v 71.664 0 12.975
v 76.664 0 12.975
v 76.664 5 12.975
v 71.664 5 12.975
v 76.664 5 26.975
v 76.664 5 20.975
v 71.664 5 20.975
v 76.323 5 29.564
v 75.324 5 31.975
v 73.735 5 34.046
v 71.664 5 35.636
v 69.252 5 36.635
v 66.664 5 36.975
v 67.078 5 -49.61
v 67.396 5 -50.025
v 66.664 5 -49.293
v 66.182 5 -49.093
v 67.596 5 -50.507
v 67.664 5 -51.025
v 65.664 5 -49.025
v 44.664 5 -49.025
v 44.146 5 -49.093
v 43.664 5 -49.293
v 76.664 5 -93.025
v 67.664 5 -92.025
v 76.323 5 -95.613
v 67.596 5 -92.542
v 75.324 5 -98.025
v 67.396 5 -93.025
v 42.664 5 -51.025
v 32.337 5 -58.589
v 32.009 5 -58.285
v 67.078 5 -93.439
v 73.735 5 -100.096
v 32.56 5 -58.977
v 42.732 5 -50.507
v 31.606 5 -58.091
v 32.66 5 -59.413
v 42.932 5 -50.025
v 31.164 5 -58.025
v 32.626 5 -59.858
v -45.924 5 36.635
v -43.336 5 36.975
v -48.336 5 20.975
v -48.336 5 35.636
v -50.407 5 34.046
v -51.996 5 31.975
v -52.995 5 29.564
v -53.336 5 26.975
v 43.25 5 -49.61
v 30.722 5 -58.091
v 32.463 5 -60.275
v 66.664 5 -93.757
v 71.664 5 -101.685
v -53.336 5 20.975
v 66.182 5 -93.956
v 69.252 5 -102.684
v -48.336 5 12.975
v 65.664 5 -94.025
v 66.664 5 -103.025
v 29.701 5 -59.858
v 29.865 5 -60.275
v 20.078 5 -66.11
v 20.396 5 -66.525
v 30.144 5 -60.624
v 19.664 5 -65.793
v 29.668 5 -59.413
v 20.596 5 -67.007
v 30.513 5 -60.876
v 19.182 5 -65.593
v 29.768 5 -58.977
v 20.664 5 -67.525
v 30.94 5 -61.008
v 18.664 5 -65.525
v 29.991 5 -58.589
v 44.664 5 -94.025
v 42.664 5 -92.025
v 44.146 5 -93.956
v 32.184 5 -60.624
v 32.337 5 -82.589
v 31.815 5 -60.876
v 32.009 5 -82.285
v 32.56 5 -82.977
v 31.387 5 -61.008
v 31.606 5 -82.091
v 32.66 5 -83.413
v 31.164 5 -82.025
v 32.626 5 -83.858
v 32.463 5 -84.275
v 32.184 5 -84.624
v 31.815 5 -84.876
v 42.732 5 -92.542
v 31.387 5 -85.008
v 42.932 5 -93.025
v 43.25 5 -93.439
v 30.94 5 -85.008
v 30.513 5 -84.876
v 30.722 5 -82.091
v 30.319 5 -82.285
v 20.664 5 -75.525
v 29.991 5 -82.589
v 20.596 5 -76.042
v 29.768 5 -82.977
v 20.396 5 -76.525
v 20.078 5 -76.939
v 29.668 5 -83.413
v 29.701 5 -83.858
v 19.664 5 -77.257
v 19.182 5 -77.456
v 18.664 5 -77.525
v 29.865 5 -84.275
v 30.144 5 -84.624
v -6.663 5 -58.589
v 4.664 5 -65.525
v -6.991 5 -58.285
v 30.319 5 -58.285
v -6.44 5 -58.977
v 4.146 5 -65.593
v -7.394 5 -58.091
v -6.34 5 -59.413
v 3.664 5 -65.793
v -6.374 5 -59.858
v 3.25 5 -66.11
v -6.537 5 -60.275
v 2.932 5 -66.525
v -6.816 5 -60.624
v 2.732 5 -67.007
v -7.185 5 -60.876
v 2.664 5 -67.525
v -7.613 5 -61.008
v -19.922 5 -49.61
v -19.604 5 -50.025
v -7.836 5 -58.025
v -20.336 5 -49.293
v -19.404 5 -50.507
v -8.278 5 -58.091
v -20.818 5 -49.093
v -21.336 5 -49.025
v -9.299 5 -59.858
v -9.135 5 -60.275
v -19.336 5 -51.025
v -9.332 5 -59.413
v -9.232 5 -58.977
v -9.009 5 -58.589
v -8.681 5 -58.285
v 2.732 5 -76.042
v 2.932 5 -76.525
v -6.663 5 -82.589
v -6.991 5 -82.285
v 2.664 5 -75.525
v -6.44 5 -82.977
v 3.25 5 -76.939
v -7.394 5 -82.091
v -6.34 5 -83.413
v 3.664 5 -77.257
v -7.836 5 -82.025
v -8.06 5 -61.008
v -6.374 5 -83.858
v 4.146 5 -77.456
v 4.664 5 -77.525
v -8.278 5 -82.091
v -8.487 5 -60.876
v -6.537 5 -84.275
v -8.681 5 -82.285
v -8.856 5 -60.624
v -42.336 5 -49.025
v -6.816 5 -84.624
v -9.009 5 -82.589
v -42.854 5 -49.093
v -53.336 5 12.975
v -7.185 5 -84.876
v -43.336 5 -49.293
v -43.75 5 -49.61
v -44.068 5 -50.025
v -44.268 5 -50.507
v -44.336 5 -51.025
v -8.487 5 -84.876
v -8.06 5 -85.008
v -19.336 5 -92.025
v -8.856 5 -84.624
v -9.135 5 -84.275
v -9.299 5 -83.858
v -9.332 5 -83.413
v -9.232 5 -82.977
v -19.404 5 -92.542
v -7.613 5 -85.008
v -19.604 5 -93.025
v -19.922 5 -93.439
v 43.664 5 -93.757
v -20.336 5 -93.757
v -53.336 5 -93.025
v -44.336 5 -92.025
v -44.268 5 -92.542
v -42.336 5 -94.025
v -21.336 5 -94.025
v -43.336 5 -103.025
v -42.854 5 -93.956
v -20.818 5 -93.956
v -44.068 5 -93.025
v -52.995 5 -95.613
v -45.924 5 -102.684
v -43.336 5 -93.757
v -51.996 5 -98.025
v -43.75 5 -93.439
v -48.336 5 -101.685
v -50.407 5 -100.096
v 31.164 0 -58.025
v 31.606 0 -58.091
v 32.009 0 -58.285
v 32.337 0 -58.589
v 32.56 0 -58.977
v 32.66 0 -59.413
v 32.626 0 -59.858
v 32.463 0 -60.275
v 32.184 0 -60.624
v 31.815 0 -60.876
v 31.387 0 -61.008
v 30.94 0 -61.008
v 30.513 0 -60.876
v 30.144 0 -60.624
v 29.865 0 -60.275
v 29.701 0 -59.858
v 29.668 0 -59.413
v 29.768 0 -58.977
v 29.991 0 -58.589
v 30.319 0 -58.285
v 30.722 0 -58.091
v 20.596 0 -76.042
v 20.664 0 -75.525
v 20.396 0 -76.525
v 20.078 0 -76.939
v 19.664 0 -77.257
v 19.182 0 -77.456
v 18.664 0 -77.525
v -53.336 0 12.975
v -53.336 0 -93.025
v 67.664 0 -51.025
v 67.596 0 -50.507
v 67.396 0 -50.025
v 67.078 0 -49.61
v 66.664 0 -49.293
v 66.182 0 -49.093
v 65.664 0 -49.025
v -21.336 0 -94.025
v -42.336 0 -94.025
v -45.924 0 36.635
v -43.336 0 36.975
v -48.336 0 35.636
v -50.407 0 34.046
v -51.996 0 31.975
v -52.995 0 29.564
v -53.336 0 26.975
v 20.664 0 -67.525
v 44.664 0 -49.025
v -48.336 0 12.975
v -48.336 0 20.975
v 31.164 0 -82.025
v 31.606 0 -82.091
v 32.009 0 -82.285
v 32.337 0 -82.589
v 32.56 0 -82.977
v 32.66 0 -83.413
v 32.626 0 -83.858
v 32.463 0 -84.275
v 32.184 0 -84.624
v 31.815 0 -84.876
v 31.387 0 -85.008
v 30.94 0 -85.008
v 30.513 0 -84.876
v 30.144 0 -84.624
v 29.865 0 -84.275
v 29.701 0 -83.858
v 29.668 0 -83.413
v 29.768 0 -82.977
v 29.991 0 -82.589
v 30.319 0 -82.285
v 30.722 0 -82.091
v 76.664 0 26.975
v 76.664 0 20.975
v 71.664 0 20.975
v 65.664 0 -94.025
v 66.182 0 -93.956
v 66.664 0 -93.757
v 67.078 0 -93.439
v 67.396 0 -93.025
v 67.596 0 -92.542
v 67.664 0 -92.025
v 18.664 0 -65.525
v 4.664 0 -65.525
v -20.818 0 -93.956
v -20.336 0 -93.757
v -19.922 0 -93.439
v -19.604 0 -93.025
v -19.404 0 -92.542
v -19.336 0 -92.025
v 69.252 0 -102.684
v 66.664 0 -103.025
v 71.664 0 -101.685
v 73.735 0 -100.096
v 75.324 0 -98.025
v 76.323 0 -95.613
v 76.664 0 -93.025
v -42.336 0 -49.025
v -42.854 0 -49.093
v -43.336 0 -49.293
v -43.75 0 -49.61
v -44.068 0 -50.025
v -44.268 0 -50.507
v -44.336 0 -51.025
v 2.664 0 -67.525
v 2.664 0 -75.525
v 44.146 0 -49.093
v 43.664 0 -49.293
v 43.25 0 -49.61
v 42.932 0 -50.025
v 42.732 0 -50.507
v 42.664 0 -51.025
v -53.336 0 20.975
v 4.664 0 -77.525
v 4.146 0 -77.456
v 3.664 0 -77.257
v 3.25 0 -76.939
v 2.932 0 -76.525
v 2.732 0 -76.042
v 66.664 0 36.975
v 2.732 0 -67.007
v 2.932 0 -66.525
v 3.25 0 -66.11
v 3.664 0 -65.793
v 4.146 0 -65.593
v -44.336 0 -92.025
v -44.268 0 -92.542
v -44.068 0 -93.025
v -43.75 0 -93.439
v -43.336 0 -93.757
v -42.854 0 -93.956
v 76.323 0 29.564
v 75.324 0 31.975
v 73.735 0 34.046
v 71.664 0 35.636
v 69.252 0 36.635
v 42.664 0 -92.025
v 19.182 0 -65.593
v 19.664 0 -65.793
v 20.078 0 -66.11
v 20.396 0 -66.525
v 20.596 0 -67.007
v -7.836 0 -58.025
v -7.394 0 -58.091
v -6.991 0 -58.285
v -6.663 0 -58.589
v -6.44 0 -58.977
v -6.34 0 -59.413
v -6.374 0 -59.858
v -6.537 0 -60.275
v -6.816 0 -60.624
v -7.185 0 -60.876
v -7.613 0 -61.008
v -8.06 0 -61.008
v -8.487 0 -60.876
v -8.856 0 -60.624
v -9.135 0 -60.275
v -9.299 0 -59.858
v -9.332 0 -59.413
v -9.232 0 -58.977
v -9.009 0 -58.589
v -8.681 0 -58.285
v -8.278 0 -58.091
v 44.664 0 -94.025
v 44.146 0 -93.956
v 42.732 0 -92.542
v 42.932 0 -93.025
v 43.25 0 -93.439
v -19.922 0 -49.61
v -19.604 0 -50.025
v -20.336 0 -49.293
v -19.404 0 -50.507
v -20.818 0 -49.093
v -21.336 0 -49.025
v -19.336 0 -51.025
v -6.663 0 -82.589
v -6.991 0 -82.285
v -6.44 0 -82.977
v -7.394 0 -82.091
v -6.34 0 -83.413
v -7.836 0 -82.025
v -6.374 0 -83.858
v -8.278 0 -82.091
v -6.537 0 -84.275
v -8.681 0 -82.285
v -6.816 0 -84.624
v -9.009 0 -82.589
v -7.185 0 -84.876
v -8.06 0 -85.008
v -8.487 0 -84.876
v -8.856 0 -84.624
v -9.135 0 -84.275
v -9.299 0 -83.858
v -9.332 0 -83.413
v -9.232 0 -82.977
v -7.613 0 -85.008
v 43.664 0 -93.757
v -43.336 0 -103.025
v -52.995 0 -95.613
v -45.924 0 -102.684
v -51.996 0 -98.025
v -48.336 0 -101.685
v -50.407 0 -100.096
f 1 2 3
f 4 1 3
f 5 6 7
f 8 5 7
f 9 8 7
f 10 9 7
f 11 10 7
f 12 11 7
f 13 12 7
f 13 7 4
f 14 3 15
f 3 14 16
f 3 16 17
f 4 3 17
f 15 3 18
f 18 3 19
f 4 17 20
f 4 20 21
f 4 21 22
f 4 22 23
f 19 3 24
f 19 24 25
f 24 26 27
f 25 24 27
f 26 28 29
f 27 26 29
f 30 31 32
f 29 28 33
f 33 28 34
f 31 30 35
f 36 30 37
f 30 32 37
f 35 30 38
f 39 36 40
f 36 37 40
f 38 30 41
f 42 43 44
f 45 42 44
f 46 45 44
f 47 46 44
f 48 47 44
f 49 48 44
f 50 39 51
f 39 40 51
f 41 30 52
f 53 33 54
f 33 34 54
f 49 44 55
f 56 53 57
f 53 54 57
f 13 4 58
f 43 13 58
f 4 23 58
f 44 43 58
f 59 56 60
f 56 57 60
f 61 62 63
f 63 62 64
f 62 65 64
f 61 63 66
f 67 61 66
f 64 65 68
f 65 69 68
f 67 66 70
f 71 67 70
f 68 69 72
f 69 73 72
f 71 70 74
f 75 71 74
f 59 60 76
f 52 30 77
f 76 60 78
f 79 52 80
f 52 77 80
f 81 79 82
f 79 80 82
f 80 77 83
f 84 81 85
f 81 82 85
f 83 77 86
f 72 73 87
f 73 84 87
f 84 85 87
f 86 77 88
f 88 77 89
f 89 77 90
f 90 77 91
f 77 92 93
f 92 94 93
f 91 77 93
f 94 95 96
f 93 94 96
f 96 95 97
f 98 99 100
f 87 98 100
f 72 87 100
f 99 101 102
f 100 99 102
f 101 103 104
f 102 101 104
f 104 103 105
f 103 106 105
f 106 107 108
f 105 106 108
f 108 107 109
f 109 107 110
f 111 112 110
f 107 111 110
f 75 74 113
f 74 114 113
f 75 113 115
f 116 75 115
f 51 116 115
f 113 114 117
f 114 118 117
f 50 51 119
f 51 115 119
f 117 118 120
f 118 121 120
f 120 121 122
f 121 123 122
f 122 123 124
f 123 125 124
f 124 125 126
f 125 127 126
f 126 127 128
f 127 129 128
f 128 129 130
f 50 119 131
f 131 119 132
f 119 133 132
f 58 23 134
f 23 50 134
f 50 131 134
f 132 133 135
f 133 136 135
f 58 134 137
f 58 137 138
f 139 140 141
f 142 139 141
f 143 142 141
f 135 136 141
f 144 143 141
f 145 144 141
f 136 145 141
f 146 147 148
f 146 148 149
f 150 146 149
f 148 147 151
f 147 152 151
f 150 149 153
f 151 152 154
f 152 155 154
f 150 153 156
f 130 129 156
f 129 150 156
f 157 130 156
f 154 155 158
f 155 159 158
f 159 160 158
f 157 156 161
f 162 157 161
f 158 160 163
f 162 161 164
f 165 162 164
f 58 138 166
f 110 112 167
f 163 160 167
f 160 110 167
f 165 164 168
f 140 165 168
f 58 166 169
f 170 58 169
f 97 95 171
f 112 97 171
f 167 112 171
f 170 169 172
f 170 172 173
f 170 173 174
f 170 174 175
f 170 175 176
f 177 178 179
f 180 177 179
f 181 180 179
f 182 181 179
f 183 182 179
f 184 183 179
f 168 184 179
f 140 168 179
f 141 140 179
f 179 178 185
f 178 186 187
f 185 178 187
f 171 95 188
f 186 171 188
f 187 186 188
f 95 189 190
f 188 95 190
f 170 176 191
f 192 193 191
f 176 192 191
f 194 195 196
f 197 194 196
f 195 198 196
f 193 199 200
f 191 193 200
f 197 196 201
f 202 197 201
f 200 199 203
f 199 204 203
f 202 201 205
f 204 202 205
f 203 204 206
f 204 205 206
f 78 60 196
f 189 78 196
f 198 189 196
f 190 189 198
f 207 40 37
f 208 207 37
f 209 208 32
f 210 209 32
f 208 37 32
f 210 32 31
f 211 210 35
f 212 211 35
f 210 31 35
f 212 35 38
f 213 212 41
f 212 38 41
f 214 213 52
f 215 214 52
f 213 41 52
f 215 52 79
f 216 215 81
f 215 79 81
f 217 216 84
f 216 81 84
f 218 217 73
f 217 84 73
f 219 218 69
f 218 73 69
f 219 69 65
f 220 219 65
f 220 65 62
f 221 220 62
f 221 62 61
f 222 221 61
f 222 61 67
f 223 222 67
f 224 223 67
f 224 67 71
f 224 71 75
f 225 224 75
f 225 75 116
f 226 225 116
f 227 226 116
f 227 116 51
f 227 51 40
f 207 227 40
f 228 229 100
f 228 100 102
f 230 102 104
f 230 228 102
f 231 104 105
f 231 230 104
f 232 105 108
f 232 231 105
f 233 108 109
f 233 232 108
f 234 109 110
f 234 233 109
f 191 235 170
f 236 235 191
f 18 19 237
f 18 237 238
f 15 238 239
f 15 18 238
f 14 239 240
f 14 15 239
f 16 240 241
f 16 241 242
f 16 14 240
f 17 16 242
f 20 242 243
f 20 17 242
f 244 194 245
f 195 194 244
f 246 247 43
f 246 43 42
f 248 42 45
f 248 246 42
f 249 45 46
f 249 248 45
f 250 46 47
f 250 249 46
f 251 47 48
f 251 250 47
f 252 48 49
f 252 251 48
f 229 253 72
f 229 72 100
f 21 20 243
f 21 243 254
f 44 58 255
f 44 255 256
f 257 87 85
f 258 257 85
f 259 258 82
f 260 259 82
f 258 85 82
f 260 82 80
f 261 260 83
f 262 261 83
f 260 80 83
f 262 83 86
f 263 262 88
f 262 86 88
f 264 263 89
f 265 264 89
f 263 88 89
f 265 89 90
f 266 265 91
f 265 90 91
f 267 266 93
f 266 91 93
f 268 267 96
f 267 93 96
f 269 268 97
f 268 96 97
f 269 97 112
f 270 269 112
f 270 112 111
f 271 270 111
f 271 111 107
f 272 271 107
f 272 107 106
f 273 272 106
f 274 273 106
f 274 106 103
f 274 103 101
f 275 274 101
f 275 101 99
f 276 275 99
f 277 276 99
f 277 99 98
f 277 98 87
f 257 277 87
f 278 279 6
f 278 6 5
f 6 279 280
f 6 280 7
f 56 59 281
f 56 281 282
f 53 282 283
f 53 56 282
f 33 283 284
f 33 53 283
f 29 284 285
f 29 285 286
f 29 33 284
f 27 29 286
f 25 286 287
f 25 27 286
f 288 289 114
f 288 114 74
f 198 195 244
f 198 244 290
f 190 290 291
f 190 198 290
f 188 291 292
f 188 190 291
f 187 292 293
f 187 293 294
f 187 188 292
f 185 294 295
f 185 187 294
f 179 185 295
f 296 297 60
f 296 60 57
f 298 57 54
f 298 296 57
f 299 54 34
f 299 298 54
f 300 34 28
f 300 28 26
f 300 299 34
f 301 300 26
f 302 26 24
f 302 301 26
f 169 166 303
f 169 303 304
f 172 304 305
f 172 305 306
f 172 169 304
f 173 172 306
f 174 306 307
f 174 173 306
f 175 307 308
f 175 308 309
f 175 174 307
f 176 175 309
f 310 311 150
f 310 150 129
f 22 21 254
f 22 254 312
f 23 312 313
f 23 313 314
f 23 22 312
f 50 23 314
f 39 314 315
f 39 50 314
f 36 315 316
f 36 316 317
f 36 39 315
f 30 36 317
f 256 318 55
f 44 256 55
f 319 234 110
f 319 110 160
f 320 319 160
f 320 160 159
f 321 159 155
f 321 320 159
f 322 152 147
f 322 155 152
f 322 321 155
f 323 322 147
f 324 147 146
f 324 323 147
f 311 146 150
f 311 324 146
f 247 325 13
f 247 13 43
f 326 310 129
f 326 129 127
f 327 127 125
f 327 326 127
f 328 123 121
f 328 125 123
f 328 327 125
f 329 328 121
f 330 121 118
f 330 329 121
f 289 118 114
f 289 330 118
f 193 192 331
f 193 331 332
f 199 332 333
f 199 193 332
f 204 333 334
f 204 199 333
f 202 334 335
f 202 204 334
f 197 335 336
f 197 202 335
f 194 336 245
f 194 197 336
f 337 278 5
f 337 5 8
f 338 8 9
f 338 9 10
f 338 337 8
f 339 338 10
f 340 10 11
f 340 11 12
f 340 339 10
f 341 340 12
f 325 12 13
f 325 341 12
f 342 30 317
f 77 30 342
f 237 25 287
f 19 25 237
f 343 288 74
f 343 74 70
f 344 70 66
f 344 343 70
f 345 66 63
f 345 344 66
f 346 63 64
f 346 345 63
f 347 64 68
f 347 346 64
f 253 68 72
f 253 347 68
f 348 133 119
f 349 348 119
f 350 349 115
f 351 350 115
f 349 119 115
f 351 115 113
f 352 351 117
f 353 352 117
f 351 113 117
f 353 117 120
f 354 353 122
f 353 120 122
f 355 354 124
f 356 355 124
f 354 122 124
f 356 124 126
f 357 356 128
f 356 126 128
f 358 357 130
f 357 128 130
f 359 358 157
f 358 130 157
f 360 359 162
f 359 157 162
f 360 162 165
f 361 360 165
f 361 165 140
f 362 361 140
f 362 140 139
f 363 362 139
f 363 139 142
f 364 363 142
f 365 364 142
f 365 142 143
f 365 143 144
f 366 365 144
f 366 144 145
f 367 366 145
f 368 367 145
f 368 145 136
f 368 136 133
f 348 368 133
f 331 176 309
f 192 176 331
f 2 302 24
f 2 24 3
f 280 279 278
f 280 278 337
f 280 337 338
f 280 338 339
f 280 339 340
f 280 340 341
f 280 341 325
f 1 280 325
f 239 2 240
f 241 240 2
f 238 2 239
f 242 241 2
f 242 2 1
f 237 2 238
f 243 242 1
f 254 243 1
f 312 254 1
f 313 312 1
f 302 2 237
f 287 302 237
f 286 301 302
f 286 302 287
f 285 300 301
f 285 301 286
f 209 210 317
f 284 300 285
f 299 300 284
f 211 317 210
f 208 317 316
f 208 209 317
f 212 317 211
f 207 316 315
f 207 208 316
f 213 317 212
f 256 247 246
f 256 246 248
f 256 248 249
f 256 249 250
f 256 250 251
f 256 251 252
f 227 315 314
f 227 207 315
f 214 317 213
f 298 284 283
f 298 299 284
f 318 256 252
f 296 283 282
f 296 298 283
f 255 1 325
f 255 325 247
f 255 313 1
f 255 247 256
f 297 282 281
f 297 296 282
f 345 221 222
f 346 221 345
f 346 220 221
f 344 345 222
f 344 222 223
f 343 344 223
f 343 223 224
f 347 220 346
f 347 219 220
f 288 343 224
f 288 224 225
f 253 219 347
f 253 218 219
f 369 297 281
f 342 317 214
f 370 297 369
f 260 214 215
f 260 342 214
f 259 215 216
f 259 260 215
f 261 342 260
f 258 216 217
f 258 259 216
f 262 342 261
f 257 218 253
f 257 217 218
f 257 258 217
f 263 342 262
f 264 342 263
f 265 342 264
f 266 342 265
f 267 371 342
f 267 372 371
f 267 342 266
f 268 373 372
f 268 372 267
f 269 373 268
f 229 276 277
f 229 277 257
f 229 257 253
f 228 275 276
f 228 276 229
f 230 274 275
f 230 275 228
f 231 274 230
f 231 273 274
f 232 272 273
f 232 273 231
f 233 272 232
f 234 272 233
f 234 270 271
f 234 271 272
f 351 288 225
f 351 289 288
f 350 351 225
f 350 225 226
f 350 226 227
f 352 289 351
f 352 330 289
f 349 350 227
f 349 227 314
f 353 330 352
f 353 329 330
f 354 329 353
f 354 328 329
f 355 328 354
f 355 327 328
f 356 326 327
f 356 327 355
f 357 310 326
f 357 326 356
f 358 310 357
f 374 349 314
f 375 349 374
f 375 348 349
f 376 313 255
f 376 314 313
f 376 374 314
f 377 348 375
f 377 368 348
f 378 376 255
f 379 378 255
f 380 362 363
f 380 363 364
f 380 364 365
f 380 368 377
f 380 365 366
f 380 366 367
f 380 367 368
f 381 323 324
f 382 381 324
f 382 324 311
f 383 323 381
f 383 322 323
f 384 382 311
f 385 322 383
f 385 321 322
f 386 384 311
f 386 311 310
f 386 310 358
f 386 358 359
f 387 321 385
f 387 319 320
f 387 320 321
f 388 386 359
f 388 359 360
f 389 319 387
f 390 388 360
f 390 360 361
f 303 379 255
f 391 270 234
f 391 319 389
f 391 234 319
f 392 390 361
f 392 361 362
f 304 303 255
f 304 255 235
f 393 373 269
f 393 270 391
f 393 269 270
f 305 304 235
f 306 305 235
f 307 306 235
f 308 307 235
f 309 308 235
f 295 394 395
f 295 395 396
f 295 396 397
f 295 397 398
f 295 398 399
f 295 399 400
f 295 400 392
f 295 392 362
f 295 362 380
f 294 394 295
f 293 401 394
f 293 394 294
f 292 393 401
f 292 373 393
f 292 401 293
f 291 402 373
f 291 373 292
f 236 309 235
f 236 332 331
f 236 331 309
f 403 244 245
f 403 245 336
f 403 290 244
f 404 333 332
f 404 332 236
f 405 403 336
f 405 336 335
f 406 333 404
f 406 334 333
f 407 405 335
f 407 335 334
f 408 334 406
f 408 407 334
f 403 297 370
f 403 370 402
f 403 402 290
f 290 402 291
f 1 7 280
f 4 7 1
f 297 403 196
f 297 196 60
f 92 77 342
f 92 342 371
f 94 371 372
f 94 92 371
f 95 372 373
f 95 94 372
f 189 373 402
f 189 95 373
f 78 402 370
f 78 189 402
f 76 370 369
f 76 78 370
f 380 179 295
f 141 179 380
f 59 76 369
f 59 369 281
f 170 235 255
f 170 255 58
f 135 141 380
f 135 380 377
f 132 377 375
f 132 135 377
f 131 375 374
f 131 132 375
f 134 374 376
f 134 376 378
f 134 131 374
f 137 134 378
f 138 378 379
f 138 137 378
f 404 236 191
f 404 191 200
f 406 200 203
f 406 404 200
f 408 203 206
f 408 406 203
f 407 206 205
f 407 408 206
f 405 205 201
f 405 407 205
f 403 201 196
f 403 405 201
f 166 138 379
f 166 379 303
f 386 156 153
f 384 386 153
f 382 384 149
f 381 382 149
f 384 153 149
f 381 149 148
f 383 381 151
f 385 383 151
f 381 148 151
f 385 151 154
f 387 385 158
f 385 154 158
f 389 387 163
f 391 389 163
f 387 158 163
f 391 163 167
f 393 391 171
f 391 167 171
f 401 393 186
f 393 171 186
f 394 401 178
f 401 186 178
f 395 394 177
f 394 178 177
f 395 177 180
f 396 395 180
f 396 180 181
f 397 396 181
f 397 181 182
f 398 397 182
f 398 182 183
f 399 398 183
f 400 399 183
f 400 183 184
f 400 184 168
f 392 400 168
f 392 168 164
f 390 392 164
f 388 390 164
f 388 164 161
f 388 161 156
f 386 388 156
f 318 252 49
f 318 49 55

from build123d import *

# Parameters (mm, degrees)
RESSALTO_EXTRUS_O1_DEPTH = 5
CORTE_EXTRUS_O1_DEPTH    = 5
ESBO_O4_R                = 1.5
CORTE_EXTRUS_O2_DEPTH    = 10
ESBO_O6_W                = 8
ESBO_O6_H                = 5
CORTE_EXTRUS_O3_DEPTH    = 5
CORTE_EXTRUS_O4_DEPTH    = 10
ESBO_O9_W                = 8
ESBO_O9_H                = 5
CORTE_EXTRUS_O5_DEPTH    = 5


with BuildPart() as part:
    # Esboço1 → Ressalto-extrusão1 (new body)
    with BuildSketch(Plane(origin=(0, 0, 0), x_dir=(1, 0, 0), z_dir=(0, 1, 0))):
        with BuildLine():
            Line((-43.336132643, 103.024644241), (66.663867357, 103.024644241))
            ThreePointArc((66.663867357, 103.024644241), (73.734935168, 100.095712053), (76.663867357, 93.024644241))
            Line((76.663867357, 93.024644241), (76.663867357, -26.975355759))
            ThreePointArc((76.663867357, -26.975355759), (73.734935168, -34.046423571), (66.663867357, -36.975355759))
            Line((66.663867357, -36.975355759), (-43.336132643, -36.975355759))
            ThreePointArc((-43.336132643, -36.975355759), (-50.407200455, -34.046423571), (-53.336132643, -26.975355759))
            Line((-53.336132643, -26.975355759), (-53.336132643, 93.024644241))
            ThreePointArc((-53.336132643, 93.024644241), (-50.407200455, 100.095712053), (-43.336132643, 103.024644241))
        make_face()
    extrude(amount=RESSALTO_EXTRUS_O1_DEPTH)

    # Esboço2 → Corte-extrusão1 (cut)
    with BuildSketch(Plane(origin=(0, 5, 0), x_dir=(1, 0, 0), z_dir=(0, 1, 0))):
        with BuildLine():
            Line((-42.336132643, 94.024644241), (-21.336132643, 94.024644241))
            ThreePointArc((-21.336132643, 94.024644241), (-19.921919081, 93.438857803), (-19.336132643, 92.024644241))
            Line((-19.336132643, 92.024644241), (-19.336132643, 51.024644241))
            ThreePointArc((-19.336132643, 51.024644241), (-19.921919081, 49.610430679), (-21.336132643, 49.024644241))
            Line((-21.336132643, 49.024644241), (-42.336132643, 49.024644241))
            ThreePointArc((-42.336132643, 49.024644241), (-43.750346206, 49.610430679), (-44.336132643, 51.024644241))
            Line((-44.336132643, 51.024644241), (-44.336132643, 92.024644241))
            ThreePointArc((-44.336132643, 92.024644241), (-43.750346206, 93.438857803), (-42.336132643, 94.024644241))
        make_face()
        with BuildLine():
            Line((44.663867357, 94.024644241), (65.663867357, 94.024644241))
            ThreePointArc((65.663867357, 94.024644241), (67.078080919, 93.438857803), (67.663867357, 92.024644241))
            Line((67.663867357, 92.024644241), (67.663867357, 51.024644241))
            ThreePointArc((67.663867357, 51.024644241), (67.078080919, 49.610430679), (65.663867357, 49.024644241))
            Line((65.663867357, 49.024644241), (44.663867357, 49.024644241))
            ThreePointArc((44.663867357, 49.024644241), (43.249653794, 49.610430679), (42.663867357, 51.024644241))
            Line((42.663867357, 51.024644241), (42.663867357, 92.024644241))
            ThreePointArc((42.663867357, 92.024644241), (43.249653794, 93.438857803), (44.663867357, 94.024644241))
        make_face()
    extrude(amount=-CORTE_EXTRUS_O1_DEPTH, mode=Mode.SUBTRACT)

    # Esboço4 → Corte-extrusão2 (cut)
    with BuildSketch(Plane(origin=(0, 5, 0), x_dir=(1, 0, 0), z_dir=(0, 1, 0))):
        with Locations(Location((-7.836132643, 59.524644241, 0), (0, 0, 270))):
            Circle(ESBO_O4_R)
        with Locations(Location((31.163867357, 59.524644241, 0), (0, 0, 270))):
            Circle(ESBO_O4_R)
        with Locations(Location((-7.836132643, 83.524644241, 0), (0, 0, 270))):
            Circle(ESBO_O4_R)
        with Locations(Location((31.163867357, 83.524644241, 0), (0, 0, 270))):
            Circle(ESBO_O4_R)
    extrude(amount=-CORTE_EXTRUS_O2_DEPTH, mode=Mode.SUBTRACT)

    # Esboço6 → Corte-extrusão3 (cut)
    with BuildSketch(Plane.ZY.offset(53.336132643)):
        with Locations((16.975355759, 2.5)):
            Rectangle(ESBO_O6_W, ESBO_O6_H)
    extrude(amount=-CORTE_EXTRUS_O3_DEPTH, mode=Mode.SUBTRACT)

    # Esboço7 → Corte-extrusão4 (cut)
    with BuildSketch(Plane.XZ):
        with BuildLine():
            Line((18.663867357, -77.524644241), (4.663867357, -77.524644241))
            ThreePointArc((4.663867357, -77.524644241), (3.249653794, -76.938857803), (2.663867357, -75.524644241))
            Line((2.663867357, -75.524644241), (2.663867357, -67.524644241))
            ThreePointArc((2.663867357, -67.524644241), (3.249653794, -66.110430679), (4.663867357, -65.524644241))
            Line((4.663867357, -65.524644241), (18.663867357, -65.524644241))
            ThreePointArc((18.663867357, -65.524644241), (20.078080919, -66.110430679), (20.663867357, -67.524644241))
            Line((20.663867357, -67.524644241), (20.663867357, -75.524644241))
            ThreePointArc((20.663867357, -75.524644241), (20.078080919, -76.938857803), (18.663867357, -77.524644241))
        make_face()
    extrude(amount=-CORTE_EXTRUS_O4_DEPTH, mode=Mode.SUBTRACT)

    # Esboço9 → Corte-extrusão5 (cut)
    with BuildSketch(Plane(origin=(76.663867357, 0, 0), x_dir=(0, 0, -1), z_dir=(1, 0, 0))):
        with Locations((-16.975355759, 2.5)):
            Rectangle(ESBO_O9_W, ESBO_O9_H)
    extrude(amount=-CORTE_EXTRUS_O5_DEPTH, mode=Mode.SUBTRACT)


solid = part.part
